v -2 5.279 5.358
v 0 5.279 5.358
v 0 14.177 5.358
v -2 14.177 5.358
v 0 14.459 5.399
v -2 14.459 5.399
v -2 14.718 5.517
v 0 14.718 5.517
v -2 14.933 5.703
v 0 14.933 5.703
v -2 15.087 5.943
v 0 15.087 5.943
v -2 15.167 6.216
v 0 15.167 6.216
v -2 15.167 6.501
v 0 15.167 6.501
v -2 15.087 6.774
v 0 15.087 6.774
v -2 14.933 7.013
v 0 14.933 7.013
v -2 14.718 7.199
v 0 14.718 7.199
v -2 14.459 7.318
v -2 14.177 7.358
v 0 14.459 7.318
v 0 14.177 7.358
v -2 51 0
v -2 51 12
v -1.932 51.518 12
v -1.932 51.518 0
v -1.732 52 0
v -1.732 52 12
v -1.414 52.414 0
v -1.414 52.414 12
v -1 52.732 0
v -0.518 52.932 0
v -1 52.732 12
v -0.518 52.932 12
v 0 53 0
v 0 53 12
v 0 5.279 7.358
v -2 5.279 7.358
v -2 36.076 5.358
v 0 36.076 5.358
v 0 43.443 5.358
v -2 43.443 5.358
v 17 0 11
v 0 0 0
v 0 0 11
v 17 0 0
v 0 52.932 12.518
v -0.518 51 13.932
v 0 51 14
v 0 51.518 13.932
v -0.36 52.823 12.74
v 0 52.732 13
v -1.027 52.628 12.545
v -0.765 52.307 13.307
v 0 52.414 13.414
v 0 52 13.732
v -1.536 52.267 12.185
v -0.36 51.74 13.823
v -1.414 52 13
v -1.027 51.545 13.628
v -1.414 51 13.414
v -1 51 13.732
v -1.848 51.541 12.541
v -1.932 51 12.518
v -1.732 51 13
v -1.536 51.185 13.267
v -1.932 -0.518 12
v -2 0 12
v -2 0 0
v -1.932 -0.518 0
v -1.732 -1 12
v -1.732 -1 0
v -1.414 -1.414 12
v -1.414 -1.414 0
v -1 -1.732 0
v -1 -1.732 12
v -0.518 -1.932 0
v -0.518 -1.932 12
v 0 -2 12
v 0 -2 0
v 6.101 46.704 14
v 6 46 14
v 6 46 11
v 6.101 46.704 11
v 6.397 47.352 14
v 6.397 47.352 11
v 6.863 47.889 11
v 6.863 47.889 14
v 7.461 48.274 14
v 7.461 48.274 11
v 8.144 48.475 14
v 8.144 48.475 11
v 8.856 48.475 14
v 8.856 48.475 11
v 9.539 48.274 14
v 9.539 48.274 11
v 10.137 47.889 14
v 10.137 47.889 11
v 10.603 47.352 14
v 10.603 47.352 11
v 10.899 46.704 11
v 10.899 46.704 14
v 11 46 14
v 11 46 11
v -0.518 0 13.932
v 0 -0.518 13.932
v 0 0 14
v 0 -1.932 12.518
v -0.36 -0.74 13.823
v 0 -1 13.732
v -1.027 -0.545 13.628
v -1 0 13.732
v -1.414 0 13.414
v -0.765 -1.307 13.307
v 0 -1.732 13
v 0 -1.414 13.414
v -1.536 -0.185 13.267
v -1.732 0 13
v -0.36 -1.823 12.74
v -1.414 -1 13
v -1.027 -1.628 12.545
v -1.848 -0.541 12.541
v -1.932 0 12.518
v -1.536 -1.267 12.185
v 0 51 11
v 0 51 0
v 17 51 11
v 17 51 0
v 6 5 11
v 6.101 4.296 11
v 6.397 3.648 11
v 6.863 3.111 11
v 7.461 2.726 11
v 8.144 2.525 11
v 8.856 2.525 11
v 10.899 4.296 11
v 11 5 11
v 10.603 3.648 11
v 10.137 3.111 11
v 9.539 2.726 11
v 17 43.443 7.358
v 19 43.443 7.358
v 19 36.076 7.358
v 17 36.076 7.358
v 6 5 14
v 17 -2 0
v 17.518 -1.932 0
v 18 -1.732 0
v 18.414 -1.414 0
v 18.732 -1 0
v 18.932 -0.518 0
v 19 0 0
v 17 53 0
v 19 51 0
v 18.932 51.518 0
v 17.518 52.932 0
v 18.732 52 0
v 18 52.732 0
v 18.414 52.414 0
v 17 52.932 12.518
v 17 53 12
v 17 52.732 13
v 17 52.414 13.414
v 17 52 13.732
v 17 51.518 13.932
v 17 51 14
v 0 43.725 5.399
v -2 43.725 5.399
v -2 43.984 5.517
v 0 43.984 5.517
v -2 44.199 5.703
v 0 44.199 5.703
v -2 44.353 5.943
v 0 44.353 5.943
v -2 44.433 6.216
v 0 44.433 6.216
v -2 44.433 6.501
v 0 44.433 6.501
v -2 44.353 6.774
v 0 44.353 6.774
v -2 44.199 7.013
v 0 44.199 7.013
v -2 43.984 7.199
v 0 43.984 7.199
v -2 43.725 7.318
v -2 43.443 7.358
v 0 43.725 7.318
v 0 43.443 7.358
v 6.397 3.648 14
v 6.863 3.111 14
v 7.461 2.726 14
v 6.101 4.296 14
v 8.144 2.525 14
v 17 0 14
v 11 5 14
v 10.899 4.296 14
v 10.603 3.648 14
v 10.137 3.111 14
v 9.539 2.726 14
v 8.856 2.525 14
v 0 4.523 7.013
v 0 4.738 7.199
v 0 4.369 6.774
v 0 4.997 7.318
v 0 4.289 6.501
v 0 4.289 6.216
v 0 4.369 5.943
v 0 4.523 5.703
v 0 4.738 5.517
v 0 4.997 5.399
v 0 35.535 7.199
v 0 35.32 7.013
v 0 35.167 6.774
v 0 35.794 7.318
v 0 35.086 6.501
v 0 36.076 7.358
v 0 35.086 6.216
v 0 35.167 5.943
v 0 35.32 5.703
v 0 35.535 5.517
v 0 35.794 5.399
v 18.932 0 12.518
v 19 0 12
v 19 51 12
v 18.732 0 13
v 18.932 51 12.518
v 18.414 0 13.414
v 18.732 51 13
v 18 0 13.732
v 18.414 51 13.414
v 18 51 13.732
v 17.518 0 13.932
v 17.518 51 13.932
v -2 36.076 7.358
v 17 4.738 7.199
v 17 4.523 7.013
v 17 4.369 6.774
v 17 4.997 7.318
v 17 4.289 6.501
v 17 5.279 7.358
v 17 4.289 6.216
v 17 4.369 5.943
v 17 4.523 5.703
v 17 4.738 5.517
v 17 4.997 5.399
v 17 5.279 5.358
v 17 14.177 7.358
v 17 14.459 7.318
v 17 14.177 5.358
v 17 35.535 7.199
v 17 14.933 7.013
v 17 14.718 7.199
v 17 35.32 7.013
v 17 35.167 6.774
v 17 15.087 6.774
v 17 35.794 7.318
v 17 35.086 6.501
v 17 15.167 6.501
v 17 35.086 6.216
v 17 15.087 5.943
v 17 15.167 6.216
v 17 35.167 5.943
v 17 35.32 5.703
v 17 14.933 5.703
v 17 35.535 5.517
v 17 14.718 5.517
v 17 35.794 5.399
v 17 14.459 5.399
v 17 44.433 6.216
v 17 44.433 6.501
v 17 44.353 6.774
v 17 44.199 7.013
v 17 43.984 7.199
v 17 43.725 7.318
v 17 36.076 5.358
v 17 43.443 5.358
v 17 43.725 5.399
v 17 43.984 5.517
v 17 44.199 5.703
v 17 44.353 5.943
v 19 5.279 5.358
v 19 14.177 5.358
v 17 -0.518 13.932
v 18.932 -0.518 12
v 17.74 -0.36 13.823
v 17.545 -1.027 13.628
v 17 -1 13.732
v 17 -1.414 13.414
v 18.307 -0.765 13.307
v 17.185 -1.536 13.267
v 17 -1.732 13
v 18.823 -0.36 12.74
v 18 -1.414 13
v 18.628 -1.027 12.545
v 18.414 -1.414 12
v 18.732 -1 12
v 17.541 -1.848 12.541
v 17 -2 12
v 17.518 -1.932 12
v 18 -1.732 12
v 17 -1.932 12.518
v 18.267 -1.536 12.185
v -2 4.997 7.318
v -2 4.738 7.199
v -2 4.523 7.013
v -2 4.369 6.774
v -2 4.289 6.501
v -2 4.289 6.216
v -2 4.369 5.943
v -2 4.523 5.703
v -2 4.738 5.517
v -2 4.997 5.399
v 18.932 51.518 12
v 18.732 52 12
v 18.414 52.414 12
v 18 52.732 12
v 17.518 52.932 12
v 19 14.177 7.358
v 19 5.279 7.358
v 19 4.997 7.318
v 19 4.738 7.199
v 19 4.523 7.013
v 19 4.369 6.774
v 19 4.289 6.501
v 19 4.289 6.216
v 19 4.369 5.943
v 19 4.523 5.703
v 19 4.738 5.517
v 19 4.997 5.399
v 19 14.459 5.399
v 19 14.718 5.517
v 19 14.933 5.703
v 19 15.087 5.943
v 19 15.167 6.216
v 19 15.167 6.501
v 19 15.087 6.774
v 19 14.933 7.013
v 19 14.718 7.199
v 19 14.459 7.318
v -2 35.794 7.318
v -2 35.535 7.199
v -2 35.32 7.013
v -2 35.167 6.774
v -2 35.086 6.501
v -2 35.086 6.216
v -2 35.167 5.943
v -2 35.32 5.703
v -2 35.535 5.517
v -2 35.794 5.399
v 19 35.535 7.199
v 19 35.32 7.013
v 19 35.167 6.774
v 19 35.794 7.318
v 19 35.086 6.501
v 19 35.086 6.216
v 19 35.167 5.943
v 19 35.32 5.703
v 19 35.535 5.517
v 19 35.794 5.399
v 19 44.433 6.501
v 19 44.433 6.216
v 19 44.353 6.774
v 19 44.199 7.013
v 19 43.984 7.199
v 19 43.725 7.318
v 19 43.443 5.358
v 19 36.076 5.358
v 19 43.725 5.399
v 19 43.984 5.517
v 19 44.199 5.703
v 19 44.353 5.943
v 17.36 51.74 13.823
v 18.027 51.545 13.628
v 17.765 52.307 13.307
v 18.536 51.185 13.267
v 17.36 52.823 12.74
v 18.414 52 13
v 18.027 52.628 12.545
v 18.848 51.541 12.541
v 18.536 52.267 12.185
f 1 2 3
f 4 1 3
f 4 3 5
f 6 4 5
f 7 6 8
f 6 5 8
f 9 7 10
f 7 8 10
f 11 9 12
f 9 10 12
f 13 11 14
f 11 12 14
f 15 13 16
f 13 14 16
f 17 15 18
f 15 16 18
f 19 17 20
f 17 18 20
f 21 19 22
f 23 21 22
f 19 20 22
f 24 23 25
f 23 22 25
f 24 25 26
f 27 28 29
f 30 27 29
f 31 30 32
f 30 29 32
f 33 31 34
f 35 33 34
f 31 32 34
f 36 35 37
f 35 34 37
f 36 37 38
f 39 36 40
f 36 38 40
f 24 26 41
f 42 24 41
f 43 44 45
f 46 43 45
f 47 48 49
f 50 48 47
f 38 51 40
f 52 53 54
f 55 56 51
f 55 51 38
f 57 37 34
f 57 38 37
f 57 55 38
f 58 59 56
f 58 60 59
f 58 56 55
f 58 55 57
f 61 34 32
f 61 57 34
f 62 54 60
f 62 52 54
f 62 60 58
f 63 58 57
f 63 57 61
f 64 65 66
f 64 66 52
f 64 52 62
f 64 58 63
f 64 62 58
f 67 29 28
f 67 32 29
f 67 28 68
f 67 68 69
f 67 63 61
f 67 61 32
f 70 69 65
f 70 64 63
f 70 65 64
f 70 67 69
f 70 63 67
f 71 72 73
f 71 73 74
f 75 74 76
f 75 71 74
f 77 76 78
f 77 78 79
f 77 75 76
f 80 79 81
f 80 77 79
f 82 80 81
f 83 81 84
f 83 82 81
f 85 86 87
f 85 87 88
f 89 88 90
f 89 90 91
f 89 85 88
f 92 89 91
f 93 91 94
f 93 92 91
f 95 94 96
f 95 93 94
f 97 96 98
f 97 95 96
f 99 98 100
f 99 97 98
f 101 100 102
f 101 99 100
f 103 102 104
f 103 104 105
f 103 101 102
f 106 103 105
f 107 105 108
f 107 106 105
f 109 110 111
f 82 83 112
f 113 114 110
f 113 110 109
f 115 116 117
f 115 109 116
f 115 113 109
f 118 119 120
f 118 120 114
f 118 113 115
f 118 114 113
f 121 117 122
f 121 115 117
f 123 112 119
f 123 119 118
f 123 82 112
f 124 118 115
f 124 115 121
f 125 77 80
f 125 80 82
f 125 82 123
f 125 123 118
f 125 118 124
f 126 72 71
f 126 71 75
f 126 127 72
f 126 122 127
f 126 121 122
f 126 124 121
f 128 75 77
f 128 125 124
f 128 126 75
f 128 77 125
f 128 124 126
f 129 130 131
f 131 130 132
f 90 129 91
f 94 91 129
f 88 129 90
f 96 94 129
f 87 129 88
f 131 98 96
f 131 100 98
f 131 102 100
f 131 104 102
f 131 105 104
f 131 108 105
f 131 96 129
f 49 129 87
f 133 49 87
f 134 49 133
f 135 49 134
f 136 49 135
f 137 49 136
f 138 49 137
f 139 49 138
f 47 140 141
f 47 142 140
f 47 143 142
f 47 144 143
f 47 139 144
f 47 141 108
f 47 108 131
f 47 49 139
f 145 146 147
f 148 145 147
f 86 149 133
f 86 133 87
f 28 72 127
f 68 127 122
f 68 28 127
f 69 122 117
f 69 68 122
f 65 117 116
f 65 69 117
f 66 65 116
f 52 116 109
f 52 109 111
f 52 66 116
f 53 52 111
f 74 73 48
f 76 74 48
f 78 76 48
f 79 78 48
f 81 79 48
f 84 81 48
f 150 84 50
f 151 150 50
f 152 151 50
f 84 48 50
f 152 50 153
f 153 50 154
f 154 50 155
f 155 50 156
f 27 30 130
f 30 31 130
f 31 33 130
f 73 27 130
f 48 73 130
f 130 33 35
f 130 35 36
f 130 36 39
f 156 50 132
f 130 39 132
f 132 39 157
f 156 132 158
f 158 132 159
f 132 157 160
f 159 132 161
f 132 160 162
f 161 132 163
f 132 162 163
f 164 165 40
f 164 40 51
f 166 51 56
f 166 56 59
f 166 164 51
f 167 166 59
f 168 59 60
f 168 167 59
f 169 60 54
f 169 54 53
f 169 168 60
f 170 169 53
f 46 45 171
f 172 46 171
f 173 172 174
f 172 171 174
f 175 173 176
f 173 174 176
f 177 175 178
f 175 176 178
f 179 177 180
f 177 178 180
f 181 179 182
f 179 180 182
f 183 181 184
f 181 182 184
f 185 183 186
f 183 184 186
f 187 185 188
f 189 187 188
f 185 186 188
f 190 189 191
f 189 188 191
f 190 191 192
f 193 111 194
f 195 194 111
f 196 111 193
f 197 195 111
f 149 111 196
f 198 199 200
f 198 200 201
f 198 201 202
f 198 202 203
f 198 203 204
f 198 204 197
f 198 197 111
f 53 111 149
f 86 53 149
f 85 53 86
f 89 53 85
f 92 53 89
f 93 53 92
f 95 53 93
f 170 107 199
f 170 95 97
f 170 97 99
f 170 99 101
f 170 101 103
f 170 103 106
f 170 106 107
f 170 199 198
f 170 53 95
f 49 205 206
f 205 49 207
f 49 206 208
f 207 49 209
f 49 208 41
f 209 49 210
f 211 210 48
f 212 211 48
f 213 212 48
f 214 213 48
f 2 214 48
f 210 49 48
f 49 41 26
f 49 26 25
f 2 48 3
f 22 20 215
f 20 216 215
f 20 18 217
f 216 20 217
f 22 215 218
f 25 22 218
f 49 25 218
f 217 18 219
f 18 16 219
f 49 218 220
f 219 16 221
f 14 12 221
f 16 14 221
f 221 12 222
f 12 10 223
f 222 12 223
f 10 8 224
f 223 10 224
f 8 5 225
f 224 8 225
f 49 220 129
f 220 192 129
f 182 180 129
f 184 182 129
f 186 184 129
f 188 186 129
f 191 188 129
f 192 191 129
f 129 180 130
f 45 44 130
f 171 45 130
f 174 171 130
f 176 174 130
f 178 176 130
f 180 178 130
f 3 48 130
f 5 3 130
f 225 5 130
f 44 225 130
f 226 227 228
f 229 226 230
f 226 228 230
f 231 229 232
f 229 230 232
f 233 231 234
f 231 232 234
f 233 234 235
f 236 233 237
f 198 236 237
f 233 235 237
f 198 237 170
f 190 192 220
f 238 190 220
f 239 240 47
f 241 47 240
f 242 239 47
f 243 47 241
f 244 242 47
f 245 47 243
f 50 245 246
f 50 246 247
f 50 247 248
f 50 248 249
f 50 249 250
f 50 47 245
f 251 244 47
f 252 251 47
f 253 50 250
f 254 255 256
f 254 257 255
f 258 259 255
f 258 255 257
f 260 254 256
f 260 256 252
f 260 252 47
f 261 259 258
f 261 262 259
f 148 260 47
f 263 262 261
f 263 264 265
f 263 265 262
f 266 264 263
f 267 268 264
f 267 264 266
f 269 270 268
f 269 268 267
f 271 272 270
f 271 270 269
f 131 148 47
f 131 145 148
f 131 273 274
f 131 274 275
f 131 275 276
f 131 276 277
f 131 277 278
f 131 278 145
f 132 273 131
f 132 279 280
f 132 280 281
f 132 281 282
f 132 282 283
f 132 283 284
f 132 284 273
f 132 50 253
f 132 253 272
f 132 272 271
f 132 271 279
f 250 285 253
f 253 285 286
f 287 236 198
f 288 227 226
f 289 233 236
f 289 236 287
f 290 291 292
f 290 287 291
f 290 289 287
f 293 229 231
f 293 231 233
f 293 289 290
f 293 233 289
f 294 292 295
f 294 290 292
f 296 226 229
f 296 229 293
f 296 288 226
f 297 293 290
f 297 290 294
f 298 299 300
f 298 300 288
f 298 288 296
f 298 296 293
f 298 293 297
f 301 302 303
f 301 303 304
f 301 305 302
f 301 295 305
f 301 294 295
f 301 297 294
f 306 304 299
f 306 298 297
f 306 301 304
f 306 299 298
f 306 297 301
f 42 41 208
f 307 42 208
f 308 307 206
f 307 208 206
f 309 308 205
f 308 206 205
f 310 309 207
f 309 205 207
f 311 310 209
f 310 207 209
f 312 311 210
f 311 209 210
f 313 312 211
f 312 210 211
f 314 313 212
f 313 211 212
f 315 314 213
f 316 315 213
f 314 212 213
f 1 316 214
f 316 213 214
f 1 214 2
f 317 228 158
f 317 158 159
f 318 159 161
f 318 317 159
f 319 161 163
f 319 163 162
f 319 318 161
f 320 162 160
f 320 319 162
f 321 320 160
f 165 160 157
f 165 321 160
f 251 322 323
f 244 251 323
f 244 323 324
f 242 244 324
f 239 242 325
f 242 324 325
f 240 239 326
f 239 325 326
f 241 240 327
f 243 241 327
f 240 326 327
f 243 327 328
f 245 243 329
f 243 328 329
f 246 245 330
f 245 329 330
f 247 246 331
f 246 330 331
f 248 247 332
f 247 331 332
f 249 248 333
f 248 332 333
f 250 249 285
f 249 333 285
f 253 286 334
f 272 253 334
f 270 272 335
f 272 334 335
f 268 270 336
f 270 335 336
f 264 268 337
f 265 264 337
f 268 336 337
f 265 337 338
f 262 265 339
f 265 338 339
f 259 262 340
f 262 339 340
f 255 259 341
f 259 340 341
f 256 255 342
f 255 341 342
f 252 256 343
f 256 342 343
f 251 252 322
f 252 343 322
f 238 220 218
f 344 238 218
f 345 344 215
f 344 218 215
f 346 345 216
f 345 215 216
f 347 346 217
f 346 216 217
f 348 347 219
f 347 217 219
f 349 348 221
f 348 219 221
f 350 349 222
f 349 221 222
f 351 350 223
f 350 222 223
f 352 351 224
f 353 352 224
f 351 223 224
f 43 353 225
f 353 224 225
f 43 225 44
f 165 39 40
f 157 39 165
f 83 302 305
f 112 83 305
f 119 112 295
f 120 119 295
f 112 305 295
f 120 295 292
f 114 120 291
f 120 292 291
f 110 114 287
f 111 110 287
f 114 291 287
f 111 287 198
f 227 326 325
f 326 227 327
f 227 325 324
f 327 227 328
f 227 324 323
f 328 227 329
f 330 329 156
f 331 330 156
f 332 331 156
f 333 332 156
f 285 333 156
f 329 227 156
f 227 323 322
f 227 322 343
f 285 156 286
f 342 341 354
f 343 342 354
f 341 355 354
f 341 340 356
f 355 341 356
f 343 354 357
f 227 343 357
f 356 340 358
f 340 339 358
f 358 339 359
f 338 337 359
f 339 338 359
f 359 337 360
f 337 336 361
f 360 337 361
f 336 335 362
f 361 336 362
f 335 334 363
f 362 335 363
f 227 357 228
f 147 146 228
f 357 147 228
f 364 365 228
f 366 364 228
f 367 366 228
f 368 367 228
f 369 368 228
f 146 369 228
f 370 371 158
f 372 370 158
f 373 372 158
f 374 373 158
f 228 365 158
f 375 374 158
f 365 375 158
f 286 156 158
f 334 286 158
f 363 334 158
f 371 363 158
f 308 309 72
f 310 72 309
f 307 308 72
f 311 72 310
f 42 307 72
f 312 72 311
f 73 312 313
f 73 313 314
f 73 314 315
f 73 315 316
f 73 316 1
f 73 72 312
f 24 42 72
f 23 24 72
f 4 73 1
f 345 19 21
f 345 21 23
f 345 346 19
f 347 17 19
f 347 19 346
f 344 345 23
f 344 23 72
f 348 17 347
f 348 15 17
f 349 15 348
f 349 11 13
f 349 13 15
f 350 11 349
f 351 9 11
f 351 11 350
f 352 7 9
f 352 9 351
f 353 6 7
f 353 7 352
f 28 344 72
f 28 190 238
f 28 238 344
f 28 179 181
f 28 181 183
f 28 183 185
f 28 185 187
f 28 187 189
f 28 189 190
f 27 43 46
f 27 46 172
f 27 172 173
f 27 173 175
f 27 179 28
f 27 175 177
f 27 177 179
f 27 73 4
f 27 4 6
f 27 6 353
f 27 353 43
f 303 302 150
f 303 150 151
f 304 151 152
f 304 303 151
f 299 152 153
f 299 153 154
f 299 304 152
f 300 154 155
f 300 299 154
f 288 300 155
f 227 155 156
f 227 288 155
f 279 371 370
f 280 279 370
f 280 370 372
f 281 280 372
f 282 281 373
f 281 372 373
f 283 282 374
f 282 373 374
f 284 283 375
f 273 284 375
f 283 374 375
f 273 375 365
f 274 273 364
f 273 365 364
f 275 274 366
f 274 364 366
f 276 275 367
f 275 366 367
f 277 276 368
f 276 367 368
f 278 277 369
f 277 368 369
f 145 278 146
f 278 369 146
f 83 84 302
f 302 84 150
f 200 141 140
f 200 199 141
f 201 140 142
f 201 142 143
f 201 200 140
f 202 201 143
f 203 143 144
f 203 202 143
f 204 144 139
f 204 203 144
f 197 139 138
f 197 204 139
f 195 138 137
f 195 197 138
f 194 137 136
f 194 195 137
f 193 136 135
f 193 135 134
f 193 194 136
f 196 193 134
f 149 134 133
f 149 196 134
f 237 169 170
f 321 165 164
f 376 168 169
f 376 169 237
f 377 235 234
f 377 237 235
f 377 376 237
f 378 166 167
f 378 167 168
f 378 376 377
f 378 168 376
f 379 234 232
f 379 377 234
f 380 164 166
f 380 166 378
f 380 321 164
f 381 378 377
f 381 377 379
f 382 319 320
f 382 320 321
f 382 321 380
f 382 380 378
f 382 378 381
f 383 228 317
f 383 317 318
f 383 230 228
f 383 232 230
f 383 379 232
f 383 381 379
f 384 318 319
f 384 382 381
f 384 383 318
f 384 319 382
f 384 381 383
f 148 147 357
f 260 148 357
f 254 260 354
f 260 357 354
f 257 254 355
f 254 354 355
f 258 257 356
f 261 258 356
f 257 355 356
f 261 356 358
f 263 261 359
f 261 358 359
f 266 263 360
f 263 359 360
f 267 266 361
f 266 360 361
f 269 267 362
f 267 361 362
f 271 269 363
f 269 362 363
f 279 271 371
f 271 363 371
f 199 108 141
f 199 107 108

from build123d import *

# Parameters (mm, degrees)
BOX_W           = 17
BOX_H           = 51
BOX_DEPTH       = 12
THICKNESS_T     = 2
POCKET_DEPTH    = 2.001
SKETCH001_W     = 17
SKETCH001_H     = 51
PAD_DEPTH       = 1
POCKET001_DEPTH = 21.001


with BuildPart() as part:
    # Box → Box (new body)
    with BuildSketch(Plane.XY):
        with Locations((8.5, 25.5)):
            Rectangle(BOX_W, BOX_H)
    extrude(amount=BOX_DEPTH)

    # Thickness
    thickness_openings = [part.faces().sort_by_distance(p)[0] for p in [
        (8.5, 25.5, 0),
    ]]
    offset(amount=THICKNESS_T, openings=thickness_openings)

    # Sketch (on Face5 of Thickness) → Pocket (cut, through all)
    with BuildSketch(Plane(origin=(0, 0, 12), x_dir=(1, 0, 0), z_dir=(0, 0, -1))):
        with BuildLine():
            ThreePointArc((11, -5), (8.5, -2.5), (6, -5))
            Line((6, -5), (6, -46))
            ThreePointArc((6, -46), (8.5, -48.5), (11, -46))
            Line((11, -46), (11, -5))
        make_face()
    extrude(amount=-POCKET_DEPTH, mode=Mode.SUBTRACT)

    # Sketch001 (on Face3 of Pocket) → Pad (join)
    with BuildSketch(Plane(origin=(0, 0, 12), x_dir=(1, 0, 0), z_dir=(0, 0, -1))):
        with Locations((8.5, -25.5)):
            Rectangle(SKETCH001_W, SKETCH001_H)
        with BuildLine():
            ThreePointArc((11, -5), (8.5, -2.5), (6, -5))
            Line((6, -5), (6, -46))
            ThreePointArc((6, -46), (8.5, -48.5), (11, -46))
            Line((11, -46), (11, -5))
        make_face(mode=Mode.SUBTRACT)
    extrude(amount=PAD_DEPTH)

    # Sketch002 (on Face17 of Pad) → Pocket001 (cut, through all)
    with BuildSketch(Plane.YZ.offset(19)):
        with BuildLine():
            ThreePointArc((36.076138, 7.358207), (35.076138, 6.358207), (36.076138, 5.358207))
            Line((36.076138, 5.358207), (43.44347, 5.358207))
            ThreePointArc((43.44347, 5.358207), (44.44347, 6.358207), (43.44347, 7.358207))
            Line((43.44347, 7.358207), (36.076138, 7.358207))
        make_face()
        with BuildLine():
            ThreePointArc((5.278592, 7.358207), (4.278592, 6.358207), (5.278592, 5.358207))
            Line((5.278592, 5.358207), (14.177313, 5.358207))
            ThreePointArc((14.177313, 5.358207), (15.177313, 6.358207), (14.177313, 7.358207))
            Line((14.177313, 7.358207), (5.278592, 7.358207))
        make_face()
    extrude(amount=-POCKET001_DEPTH, mode=Mode.SUBTRACT)


solid = part.part
